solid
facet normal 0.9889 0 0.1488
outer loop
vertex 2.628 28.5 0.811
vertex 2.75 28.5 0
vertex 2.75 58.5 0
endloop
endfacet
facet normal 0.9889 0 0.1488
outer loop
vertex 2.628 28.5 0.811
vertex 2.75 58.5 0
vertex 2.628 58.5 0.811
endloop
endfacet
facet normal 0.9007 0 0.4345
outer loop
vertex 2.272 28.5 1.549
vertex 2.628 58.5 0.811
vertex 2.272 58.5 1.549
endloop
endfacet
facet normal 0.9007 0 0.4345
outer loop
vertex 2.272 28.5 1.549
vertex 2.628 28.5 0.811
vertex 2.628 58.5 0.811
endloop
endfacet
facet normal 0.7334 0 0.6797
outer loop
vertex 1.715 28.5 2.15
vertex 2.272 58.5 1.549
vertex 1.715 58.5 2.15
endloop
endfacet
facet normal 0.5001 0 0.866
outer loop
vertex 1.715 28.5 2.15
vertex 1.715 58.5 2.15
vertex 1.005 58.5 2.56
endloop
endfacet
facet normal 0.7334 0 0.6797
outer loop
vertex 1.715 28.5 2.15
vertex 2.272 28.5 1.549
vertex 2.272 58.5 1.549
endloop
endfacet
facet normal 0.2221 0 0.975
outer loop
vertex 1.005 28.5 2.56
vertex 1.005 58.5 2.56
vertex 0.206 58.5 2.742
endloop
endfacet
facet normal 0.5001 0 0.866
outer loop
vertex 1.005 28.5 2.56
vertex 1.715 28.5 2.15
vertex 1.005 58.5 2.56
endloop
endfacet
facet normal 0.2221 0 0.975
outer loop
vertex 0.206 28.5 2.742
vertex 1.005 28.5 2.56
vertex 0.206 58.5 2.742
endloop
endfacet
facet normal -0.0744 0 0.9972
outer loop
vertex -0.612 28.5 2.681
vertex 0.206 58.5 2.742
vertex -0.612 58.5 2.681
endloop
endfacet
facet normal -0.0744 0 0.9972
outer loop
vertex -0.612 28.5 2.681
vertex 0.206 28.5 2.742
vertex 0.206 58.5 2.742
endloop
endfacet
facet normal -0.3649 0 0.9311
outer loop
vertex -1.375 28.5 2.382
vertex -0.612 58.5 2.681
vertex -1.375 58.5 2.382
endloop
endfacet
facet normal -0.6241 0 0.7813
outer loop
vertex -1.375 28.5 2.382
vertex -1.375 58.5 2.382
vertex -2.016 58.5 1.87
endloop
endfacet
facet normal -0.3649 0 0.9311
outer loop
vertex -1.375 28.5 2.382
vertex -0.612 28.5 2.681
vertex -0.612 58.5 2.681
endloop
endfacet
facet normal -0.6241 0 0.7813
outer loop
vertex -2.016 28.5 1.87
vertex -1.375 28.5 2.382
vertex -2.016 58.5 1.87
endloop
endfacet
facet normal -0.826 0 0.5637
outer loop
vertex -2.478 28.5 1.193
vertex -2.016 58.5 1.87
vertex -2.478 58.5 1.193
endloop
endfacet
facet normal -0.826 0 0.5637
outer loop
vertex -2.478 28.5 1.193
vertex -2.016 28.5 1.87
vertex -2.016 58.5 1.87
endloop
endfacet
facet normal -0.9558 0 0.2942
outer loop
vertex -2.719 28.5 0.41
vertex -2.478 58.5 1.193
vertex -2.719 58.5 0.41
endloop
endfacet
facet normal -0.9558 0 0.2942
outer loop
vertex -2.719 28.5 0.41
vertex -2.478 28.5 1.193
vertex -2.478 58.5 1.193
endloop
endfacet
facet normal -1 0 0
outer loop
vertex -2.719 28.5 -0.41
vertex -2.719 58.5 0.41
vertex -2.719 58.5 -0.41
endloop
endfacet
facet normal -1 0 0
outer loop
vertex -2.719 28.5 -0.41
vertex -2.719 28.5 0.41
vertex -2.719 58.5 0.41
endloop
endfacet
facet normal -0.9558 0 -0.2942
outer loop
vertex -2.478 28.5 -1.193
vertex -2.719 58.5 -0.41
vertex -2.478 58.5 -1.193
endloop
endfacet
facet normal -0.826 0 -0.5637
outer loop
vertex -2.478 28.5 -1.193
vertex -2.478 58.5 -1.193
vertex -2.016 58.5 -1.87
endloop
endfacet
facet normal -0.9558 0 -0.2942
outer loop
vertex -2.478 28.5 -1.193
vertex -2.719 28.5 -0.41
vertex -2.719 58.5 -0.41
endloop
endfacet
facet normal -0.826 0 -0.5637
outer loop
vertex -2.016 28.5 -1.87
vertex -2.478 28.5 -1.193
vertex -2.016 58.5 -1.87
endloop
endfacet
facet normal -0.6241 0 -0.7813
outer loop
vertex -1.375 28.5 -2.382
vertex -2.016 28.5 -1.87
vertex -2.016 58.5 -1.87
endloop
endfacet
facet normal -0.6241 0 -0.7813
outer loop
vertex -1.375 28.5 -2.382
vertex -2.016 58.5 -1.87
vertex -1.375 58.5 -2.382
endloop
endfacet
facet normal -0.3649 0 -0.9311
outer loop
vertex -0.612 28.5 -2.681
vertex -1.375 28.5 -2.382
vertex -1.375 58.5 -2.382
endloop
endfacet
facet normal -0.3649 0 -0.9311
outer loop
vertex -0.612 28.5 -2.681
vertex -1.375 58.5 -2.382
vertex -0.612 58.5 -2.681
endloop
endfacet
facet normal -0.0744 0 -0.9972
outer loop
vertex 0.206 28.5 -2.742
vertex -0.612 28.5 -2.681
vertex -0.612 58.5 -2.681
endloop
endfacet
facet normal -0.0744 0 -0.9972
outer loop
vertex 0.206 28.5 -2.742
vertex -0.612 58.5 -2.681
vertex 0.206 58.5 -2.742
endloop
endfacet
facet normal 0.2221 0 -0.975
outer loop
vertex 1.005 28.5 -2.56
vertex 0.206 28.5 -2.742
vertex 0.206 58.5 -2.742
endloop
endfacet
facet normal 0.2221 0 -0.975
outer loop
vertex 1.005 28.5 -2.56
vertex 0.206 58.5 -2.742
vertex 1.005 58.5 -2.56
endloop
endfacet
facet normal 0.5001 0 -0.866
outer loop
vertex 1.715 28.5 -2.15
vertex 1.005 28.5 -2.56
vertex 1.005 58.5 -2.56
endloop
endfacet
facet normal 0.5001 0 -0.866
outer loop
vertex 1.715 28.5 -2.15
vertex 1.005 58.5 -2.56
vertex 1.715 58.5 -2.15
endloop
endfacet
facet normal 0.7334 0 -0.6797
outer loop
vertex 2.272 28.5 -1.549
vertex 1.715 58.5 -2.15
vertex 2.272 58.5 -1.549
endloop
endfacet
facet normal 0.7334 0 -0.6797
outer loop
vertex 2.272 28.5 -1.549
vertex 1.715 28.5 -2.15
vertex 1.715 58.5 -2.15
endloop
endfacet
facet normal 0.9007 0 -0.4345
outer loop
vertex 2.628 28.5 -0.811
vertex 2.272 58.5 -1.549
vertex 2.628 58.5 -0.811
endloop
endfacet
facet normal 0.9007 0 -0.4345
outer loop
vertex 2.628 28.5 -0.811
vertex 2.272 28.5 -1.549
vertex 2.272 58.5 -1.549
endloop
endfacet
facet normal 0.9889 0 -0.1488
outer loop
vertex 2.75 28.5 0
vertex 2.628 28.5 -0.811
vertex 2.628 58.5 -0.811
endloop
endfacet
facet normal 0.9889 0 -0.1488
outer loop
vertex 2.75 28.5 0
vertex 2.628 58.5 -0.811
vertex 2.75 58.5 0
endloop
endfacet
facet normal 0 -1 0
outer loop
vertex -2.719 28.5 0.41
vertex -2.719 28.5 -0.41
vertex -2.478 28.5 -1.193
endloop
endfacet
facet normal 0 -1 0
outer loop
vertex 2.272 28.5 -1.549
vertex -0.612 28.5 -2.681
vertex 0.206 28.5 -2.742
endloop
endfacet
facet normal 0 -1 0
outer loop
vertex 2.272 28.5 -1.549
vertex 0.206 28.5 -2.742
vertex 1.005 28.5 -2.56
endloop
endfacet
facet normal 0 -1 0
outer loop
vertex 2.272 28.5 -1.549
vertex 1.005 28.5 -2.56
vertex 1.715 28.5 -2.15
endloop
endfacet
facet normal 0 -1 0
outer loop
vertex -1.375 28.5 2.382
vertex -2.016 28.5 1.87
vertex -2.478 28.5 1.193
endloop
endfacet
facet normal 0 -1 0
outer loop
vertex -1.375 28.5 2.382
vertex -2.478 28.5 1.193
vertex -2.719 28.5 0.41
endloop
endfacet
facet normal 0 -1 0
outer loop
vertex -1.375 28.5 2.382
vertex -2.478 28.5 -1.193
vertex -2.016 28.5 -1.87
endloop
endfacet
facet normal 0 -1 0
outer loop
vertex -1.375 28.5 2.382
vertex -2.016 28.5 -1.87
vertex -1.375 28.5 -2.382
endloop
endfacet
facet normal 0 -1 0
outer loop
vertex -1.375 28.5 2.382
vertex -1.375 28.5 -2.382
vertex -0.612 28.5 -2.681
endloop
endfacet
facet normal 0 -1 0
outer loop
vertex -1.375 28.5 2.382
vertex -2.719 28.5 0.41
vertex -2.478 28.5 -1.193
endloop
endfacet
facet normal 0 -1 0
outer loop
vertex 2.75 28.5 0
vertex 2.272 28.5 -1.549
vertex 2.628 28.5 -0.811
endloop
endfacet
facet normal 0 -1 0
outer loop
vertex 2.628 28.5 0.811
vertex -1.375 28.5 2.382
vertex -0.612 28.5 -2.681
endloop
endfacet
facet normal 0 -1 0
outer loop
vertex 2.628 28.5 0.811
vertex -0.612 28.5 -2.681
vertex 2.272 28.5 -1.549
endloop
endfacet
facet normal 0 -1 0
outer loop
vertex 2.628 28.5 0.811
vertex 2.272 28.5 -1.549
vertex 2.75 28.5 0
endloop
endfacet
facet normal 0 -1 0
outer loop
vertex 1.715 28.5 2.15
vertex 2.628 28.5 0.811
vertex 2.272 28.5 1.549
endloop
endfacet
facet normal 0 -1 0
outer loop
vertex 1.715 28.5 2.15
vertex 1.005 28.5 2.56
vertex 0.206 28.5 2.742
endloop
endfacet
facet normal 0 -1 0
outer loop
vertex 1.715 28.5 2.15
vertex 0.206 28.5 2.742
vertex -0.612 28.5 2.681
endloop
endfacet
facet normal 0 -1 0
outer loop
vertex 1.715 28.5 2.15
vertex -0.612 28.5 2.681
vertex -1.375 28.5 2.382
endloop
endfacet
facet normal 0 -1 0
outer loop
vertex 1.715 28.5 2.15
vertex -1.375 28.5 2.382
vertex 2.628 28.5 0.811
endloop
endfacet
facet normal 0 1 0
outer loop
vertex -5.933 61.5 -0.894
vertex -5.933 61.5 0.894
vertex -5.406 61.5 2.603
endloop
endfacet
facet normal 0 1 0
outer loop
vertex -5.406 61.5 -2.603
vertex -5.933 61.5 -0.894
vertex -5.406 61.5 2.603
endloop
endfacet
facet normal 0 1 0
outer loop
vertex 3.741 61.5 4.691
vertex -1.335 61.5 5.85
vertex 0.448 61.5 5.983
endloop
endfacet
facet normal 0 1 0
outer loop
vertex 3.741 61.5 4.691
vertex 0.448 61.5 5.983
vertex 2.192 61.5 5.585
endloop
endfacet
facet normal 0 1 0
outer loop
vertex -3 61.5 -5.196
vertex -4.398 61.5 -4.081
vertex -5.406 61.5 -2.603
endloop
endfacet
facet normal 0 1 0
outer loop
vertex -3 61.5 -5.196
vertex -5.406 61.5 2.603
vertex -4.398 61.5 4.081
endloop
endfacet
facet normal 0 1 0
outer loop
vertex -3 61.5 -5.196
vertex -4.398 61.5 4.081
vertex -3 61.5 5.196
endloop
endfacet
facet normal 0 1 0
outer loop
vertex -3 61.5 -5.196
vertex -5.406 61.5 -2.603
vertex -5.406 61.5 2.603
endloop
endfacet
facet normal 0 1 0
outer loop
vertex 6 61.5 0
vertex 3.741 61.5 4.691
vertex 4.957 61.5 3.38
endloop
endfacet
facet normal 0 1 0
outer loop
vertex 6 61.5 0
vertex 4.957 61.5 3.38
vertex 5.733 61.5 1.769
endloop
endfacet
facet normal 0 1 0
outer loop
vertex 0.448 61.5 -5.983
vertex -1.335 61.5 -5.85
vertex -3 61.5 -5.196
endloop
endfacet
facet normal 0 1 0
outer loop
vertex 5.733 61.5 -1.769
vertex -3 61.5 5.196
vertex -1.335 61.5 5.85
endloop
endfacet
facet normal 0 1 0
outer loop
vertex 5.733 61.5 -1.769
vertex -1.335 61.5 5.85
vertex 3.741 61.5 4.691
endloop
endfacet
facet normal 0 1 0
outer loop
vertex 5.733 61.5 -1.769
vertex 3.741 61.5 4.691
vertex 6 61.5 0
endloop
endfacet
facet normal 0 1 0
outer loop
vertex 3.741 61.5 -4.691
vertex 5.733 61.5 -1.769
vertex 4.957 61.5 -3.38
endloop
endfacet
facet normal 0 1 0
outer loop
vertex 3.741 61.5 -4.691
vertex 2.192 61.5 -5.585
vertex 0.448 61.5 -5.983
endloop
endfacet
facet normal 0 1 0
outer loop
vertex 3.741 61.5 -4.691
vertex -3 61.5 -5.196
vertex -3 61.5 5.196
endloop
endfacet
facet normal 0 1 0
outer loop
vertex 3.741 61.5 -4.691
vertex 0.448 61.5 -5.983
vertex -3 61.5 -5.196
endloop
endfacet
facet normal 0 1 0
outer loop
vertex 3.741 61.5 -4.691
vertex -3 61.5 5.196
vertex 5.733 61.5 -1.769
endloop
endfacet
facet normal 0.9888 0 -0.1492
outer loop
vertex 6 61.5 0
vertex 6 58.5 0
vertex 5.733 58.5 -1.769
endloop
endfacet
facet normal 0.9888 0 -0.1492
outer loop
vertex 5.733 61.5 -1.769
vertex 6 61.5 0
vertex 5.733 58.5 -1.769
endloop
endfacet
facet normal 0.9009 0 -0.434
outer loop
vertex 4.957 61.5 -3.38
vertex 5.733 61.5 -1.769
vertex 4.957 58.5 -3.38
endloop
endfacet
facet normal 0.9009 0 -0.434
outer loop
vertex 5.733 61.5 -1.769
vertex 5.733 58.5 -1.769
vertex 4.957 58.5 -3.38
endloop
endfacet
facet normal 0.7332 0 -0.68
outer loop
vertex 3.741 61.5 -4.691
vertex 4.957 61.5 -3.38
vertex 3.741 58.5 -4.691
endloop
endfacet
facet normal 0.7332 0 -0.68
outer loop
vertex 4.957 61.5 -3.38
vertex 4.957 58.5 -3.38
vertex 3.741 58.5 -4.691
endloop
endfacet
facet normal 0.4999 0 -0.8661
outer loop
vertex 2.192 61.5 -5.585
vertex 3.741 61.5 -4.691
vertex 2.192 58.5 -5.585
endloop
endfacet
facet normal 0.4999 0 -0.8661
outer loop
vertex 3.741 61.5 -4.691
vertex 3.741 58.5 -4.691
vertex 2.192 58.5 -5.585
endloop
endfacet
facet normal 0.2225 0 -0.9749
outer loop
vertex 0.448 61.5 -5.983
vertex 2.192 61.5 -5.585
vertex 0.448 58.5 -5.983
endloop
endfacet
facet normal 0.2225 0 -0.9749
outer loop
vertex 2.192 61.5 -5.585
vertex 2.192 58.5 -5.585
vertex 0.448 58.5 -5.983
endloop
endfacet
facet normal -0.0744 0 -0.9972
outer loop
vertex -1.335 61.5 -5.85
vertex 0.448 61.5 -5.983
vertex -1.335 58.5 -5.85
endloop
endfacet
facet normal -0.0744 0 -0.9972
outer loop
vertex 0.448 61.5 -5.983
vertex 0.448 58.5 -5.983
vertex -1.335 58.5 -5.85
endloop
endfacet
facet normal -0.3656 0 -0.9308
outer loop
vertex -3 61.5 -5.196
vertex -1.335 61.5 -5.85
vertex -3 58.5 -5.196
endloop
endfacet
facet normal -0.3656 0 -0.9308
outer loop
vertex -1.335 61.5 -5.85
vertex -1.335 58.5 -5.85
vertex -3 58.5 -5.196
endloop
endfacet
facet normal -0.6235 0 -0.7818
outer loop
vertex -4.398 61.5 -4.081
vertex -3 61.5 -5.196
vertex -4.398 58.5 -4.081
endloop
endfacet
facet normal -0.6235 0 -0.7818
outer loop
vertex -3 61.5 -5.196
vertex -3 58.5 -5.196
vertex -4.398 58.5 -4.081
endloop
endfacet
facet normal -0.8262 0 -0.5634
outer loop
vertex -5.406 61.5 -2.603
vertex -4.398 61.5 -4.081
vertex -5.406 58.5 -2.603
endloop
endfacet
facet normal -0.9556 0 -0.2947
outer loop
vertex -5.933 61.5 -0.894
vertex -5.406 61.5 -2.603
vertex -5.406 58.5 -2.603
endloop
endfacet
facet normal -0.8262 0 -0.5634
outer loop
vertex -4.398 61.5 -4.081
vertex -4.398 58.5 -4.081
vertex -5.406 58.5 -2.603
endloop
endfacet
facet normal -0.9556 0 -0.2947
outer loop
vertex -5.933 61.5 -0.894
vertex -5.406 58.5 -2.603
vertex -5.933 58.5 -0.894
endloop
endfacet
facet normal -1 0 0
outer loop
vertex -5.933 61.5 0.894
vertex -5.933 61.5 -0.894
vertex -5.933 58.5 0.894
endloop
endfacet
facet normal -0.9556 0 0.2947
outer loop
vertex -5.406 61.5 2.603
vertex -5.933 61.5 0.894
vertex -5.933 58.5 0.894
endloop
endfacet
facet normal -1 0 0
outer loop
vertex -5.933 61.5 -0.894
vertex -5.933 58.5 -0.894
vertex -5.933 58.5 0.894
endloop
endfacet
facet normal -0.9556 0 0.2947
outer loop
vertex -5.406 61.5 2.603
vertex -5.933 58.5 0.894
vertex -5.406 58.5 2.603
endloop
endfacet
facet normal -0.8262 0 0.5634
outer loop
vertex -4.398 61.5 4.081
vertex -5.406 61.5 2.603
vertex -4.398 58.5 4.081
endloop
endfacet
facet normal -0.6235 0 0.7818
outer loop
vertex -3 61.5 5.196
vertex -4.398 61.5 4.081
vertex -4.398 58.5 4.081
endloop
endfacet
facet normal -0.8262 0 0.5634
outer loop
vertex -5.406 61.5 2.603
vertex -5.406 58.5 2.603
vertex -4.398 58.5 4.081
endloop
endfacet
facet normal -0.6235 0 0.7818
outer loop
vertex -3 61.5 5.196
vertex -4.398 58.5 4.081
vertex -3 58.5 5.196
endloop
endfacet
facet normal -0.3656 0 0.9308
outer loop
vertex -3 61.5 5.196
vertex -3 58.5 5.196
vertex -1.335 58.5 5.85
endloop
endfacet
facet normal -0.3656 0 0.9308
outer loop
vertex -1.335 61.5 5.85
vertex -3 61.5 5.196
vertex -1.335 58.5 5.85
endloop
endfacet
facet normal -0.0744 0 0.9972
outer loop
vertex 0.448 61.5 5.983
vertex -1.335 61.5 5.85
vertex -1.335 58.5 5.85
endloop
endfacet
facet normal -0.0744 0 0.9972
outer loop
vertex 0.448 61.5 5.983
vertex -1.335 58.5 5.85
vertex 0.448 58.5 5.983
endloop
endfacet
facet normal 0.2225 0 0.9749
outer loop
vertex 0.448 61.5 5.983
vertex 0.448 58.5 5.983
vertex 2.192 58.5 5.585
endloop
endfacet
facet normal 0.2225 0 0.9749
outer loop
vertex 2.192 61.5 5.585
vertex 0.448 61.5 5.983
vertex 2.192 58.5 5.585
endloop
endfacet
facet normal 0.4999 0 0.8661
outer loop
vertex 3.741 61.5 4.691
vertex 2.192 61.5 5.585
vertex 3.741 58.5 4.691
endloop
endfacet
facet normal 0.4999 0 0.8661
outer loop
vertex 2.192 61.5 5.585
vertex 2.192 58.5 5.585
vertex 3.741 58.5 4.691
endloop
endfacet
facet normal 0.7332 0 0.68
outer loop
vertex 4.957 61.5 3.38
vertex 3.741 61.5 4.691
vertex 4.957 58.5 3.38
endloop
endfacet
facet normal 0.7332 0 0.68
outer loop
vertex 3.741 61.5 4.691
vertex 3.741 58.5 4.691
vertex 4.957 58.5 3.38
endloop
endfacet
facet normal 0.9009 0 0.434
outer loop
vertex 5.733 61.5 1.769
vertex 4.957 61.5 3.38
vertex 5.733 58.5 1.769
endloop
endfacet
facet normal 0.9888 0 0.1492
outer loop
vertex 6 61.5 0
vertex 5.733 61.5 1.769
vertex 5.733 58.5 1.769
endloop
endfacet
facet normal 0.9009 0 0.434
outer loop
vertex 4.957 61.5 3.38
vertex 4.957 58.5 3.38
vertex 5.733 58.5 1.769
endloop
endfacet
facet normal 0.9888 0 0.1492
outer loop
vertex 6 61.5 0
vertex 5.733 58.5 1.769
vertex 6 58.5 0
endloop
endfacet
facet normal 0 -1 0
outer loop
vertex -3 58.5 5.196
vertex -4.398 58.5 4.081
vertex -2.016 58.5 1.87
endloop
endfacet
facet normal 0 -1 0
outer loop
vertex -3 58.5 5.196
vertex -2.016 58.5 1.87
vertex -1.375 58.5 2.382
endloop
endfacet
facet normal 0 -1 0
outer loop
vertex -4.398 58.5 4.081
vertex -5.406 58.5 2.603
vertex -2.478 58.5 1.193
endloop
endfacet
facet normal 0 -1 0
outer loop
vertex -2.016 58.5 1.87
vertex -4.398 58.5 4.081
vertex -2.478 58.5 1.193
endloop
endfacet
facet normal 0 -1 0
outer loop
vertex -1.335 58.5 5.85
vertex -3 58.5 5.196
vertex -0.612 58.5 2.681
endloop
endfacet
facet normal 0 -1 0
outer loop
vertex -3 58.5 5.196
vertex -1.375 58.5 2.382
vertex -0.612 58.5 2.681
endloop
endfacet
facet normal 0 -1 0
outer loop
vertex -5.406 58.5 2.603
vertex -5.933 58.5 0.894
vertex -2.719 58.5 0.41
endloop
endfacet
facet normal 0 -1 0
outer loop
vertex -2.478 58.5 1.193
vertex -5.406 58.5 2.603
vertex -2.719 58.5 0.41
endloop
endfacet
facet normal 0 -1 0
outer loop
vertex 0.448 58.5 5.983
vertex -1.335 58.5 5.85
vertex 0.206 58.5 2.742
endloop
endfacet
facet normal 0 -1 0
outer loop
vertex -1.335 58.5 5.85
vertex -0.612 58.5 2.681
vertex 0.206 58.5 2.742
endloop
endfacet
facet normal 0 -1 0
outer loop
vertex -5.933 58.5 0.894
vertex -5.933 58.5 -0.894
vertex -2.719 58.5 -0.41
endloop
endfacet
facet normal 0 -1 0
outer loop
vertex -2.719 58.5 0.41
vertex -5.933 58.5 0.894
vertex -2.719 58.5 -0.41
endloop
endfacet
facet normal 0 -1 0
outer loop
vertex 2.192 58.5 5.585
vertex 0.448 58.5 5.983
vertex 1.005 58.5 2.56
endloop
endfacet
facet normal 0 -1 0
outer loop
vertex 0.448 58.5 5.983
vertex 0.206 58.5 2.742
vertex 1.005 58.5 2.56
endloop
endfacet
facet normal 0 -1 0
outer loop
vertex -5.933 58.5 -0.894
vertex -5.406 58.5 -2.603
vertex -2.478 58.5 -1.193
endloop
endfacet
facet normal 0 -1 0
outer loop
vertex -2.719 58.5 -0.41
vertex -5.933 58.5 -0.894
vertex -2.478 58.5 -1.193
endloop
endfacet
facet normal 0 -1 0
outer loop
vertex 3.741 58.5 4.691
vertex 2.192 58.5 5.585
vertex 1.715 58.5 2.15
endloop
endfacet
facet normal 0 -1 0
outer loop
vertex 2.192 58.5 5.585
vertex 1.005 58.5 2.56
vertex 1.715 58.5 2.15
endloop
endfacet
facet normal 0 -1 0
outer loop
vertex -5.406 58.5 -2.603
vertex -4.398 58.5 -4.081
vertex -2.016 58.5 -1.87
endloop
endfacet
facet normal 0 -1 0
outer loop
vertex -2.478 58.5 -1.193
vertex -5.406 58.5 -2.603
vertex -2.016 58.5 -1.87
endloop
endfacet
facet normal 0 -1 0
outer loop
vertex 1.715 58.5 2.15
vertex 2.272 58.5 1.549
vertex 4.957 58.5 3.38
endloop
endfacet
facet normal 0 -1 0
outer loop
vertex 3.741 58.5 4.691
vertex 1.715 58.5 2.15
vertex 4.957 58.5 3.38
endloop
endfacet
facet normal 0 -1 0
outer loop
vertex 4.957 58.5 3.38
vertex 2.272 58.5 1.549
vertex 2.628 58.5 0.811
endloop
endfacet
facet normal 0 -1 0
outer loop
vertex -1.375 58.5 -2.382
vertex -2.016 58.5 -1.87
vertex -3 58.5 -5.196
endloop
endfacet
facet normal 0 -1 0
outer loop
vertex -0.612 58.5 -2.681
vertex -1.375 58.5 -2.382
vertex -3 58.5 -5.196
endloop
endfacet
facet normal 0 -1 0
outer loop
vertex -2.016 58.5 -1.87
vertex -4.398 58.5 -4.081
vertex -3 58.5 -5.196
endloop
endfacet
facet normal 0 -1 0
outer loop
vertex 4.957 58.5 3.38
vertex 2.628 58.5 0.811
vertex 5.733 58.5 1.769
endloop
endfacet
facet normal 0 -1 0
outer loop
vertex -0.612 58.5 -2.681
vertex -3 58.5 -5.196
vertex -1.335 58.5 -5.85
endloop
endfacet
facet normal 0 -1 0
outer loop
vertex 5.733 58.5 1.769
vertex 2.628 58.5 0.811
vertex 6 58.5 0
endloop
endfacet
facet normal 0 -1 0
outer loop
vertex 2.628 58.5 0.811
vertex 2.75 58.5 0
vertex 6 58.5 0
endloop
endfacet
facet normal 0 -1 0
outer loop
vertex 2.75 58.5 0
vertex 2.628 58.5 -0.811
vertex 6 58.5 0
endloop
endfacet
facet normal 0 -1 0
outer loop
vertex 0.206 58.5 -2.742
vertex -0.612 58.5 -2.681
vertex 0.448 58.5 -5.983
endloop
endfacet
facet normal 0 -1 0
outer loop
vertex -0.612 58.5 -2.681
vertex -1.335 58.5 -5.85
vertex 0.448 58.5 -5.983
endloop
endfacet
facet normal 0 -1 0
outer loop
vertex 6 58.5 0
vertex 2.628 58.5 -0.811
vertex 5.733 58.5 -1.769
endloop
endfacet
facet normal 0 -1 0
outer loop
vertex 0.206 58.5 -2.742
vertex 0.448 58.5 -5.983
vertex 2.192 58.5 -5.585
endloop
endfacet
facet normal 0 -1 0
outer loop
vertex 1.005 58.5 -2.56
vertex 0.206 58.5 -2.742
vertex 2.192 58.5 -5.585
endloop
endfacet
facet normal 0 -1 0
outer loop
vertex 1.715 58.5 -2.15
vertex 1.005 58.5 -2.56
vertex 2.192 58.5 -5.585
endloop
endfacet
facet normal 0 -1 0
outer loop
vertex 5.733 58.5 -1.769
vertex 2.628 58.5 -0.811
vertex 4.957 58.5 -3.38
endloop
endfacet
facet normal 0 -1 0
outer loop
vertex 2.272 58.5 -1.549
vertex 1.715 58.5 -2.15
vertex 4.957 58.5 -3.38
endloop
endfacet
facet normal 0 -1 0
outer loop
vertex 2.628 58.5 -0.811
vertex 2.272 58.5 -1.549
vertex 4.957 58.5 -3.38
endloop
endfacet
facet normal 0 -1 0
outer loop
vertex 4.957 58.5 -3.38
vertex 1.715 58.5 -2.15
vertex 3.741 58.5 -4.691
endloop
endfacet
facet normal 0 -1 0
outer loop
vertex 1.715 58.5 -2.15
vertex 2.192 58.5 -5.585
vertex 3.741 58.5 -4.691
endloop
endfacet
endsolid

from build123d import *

# Parameters (mm, degrees)
SKETCH1_R           = 10
BOSS_EXTRUDE1_DEPTH = 90
SCALE_1_SCALE       = 0.3
SKETCH_1_R          = 6
EXTRUDE_1_DEPTH     = 3
SKETCH_2_R          = 3
EXTRUDE_3_DEPTH     = 3
SKETCH_3_R          = 3
SKETCH_3_R_2        = 2.75
CUT_EXTRUDE_2_DEPTH = 30


with BuildPart() as part:
    # Sketch1 → Boss-Extrude1 (new body)
    with BuildSketch(Plane(origin=(0, 0, 0), x_dir=(1, 0, 0), z_dir=(0, 1, 0))):
        Circle(SKETCH1_R)
    extrude(amount=BOSS_EXTRUDE1_DEPTH)


with BuildPart() as part_1:
    # 축척1: scaled about (0, 45, 0)
    add(part.part.scale(SCALE_1_SCALE).moved(Location((0, 31.5, 0))))

    # 스케치1 → 보스-돌출1 (add)
    with BuildSketch(Plane(origin=(0, 58.5, 0), x_dir=(1, 0, 0), z_dir=(0, 1, 0))):
        Circle(SKETCH_1_R)
    extrude(amount=EXTRUDE_1_DEPTH)

    # 스케치2 → 보스-돌출3 (add)
    with BuildSketch(Plane.XZ.offset(-31.5)):
        Circle(SKETCH_2_R)
    extrude(amount=EXTRUDE_3_DEPTH)

    # 스케치3 → 컷-돌출2 (cut)
    with BuildSketch(Plane.XZ.offset(-28.5)):
        Circle(SKETCH_3_R)
        Circle(SKETCH_3_R_2, mode=Mode.SUBTRACT)
    extrude(amount=-CUT_EXTRUDE_2_DEPTH, mode=Mode.SUBTRACT)


solid = part_1.part
